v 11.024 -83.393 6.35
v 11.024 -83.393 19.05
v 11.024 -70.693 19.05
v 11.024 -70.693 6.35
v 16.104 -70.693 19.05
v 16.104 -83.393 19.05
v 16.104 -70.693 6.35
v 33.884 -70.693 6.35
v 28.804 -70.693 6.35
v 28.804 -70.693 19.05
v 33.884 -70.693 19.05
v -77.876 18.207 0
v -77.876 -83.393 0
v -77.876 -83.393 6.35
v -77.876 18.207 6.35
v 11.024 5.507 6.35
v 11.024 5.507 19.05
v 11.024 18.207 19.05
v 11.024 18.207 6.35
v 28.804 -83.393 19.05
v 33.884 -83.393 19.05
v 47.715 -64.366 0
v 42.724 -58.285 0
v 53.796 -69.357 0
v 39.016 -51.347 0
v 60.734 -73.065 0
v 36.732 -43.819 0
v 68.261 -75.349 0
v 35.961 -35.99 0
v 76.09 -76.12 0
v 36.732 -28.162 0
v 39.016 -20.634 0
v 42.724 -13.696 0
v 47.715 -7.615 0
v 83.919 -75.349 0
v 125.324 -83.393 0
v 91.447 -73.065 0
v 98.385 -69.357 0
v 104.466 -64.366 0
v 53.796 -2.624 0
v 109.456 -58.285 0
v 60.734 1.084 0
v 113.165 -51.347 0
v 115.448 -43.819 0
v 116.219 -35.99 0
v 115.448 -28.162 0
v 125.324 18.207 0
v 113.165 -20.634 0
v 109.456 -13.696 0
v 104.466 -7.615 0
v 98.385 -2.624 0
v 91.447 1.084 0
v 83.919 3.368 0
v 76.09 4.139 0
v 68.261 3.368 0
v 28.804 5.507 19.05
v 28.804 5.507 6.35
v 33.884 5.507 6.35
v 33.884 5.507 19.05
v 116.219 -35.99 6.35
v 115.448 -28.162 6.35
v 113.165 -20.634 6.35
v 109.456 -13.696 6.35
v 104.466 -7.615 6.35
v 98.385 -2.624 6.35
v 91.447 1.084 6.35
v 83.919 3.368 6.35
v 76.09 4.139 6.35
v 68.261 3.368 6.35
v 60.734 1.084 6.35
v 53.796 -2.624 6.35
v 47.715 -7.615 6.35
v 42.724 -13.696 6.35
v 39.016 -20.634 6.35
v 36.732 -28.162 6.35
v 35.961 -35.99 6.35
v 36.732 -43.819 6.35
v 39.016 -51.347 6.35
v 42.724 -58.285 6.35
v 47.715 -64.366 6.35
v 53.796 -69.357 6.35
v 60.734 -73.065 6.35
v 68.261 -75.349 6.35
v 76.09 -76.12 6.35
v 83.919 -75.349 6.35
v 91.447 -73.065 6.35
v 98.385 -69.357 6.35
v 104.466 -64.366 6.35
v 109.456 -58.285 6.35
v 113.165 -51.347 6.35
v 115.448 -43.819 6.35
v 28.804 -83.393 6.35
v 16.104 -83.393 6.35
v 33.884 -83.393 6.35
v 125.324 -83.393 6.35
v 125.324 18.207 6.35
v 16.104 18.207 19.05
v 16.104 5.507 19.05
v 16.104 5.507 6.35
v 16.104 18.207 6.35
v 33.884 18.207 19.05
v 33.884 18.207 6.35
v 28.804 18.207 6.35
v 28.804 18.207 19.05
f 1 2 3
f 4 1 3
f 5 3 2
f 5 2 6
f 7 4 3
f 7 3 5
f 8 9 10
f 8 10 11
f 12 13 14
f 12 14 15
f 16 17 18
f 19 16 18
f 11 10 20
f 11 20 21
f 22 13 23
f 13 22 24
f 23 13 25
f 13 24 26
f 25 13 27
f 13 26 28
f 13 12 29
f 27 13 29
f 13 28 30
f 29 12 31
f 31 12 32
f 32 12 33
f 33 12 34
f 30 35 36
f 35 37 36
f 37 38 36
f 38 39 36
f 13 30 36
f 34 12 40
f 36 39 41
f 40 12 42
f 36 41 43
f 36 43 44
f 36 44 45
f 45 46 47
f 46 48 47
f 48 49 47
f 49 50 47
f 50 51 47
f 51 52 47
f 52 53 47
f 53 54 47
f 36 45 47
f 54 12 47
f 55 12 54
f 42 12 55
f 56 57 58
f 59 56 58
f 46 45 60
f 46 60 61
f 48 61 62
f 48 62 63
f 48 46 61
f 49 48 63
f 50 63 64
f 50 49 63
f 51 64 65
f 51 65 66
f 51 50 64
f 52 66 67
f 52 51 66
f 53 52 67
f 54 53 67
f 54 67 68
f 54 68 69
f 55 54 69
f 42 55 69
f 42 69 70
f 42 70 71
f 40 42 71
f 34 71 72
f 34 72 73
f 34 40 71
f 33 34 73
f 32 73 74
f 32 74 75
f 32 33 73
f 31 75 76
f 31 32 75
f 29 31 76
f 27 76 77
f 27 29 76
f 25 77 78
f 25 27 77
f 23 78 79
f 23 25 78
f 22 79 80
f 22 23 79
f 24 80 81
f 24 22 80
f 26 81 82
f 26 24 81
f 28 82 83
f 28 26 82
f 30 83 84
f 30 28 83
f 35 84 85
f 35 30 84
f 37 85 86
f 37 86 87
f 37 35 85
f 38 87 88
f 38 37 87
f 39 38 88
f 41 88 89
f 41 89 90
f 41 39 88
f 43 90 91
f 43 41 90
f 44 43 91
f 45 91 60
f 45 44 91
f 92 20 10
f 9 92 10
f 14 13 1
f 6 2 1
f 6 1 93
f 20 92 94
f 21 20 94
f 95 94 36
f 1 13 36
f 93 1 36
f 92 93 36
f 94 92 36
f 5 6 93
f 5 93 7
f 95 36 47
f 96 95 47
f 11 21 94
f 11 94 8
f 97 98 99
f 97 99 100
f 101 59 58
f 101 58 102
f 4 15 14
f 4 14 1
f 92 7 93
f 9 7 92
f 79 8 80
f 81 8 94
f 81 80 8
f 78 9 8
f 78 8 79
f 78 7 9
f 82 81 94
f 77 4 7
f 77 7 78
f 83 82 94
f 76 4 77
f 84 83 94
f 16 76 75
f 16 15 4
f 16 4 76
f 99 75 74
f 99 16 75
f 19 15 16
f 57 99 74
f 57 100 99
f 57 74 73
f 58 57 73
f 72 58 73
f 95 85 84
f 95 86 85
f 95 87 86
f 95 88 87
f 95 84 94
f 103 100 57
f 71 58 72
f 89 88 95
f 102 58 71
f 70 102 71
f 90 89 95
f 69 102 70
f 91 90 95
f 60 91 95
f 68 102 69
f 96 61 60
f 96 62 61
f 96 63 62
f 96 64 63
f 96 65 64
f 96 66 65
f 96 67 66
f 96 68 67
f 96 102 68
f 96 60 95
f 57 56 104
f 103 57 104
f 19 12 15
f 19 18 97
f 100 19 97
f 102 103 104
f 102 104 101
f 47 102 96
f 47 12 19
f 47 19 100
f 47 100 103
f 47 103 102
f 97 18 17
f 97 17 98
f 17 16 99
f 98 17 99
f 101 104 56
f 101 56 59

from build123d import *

# Parameters (mm, degrees)
F0_W     = 203.2
F0_H     = 101.6
F0_R     = 40.12907
F1_DEPTH = 6.35
F2_W     = 5.08
F2_H     = 12.7
F3_DEPTH = 12.7
F4_DEPTH = 12.7


with BuildPart() as f1:
    # F0 (on Top) → F1 (new body)
    with BuildSketch(Plane.XY):
        with Locations((23.723893, -32.59281)):
            Rectangle(F0_W, F0_H)
        with Locations((76.090291, -35.990499)):
            Circle(F0_R, mode=Mode.SUBTRACT)
    extrude(amount=F1_DEPTH)

    # F2 (on face) → F3 (join)
    with BuildSketch(Plane.XY.offset(6.35)):
        with Locations((13.563893, -77.04281)):
            Rectangle(F2_W, F2_H)
        with Locations((31.343893, -77.04281)):
            Rectangle(F2_W, F2_H)
    extrude(amount=F3_DEPTH)

    # F2 (on face) → F4 (join)
    with BuildSketch(Plane.XY.offset(6.35)):
        with Locations((31.343893, -77.04281)):
            Rectangle(F2_W, F2_H)
        with Locations((13.563893, -77.04281)):
            Rectangle(F2_W, F2_H)
        with Locations((31.343893, 11.85719)):
            Rectangle(F2_W, F2_H)
        with Locations((13.563893, 11.85719)):
            Rectangle(F2_W, F2_H)
    extrude(amount=F4_DEPTH)


solid = f1.part
